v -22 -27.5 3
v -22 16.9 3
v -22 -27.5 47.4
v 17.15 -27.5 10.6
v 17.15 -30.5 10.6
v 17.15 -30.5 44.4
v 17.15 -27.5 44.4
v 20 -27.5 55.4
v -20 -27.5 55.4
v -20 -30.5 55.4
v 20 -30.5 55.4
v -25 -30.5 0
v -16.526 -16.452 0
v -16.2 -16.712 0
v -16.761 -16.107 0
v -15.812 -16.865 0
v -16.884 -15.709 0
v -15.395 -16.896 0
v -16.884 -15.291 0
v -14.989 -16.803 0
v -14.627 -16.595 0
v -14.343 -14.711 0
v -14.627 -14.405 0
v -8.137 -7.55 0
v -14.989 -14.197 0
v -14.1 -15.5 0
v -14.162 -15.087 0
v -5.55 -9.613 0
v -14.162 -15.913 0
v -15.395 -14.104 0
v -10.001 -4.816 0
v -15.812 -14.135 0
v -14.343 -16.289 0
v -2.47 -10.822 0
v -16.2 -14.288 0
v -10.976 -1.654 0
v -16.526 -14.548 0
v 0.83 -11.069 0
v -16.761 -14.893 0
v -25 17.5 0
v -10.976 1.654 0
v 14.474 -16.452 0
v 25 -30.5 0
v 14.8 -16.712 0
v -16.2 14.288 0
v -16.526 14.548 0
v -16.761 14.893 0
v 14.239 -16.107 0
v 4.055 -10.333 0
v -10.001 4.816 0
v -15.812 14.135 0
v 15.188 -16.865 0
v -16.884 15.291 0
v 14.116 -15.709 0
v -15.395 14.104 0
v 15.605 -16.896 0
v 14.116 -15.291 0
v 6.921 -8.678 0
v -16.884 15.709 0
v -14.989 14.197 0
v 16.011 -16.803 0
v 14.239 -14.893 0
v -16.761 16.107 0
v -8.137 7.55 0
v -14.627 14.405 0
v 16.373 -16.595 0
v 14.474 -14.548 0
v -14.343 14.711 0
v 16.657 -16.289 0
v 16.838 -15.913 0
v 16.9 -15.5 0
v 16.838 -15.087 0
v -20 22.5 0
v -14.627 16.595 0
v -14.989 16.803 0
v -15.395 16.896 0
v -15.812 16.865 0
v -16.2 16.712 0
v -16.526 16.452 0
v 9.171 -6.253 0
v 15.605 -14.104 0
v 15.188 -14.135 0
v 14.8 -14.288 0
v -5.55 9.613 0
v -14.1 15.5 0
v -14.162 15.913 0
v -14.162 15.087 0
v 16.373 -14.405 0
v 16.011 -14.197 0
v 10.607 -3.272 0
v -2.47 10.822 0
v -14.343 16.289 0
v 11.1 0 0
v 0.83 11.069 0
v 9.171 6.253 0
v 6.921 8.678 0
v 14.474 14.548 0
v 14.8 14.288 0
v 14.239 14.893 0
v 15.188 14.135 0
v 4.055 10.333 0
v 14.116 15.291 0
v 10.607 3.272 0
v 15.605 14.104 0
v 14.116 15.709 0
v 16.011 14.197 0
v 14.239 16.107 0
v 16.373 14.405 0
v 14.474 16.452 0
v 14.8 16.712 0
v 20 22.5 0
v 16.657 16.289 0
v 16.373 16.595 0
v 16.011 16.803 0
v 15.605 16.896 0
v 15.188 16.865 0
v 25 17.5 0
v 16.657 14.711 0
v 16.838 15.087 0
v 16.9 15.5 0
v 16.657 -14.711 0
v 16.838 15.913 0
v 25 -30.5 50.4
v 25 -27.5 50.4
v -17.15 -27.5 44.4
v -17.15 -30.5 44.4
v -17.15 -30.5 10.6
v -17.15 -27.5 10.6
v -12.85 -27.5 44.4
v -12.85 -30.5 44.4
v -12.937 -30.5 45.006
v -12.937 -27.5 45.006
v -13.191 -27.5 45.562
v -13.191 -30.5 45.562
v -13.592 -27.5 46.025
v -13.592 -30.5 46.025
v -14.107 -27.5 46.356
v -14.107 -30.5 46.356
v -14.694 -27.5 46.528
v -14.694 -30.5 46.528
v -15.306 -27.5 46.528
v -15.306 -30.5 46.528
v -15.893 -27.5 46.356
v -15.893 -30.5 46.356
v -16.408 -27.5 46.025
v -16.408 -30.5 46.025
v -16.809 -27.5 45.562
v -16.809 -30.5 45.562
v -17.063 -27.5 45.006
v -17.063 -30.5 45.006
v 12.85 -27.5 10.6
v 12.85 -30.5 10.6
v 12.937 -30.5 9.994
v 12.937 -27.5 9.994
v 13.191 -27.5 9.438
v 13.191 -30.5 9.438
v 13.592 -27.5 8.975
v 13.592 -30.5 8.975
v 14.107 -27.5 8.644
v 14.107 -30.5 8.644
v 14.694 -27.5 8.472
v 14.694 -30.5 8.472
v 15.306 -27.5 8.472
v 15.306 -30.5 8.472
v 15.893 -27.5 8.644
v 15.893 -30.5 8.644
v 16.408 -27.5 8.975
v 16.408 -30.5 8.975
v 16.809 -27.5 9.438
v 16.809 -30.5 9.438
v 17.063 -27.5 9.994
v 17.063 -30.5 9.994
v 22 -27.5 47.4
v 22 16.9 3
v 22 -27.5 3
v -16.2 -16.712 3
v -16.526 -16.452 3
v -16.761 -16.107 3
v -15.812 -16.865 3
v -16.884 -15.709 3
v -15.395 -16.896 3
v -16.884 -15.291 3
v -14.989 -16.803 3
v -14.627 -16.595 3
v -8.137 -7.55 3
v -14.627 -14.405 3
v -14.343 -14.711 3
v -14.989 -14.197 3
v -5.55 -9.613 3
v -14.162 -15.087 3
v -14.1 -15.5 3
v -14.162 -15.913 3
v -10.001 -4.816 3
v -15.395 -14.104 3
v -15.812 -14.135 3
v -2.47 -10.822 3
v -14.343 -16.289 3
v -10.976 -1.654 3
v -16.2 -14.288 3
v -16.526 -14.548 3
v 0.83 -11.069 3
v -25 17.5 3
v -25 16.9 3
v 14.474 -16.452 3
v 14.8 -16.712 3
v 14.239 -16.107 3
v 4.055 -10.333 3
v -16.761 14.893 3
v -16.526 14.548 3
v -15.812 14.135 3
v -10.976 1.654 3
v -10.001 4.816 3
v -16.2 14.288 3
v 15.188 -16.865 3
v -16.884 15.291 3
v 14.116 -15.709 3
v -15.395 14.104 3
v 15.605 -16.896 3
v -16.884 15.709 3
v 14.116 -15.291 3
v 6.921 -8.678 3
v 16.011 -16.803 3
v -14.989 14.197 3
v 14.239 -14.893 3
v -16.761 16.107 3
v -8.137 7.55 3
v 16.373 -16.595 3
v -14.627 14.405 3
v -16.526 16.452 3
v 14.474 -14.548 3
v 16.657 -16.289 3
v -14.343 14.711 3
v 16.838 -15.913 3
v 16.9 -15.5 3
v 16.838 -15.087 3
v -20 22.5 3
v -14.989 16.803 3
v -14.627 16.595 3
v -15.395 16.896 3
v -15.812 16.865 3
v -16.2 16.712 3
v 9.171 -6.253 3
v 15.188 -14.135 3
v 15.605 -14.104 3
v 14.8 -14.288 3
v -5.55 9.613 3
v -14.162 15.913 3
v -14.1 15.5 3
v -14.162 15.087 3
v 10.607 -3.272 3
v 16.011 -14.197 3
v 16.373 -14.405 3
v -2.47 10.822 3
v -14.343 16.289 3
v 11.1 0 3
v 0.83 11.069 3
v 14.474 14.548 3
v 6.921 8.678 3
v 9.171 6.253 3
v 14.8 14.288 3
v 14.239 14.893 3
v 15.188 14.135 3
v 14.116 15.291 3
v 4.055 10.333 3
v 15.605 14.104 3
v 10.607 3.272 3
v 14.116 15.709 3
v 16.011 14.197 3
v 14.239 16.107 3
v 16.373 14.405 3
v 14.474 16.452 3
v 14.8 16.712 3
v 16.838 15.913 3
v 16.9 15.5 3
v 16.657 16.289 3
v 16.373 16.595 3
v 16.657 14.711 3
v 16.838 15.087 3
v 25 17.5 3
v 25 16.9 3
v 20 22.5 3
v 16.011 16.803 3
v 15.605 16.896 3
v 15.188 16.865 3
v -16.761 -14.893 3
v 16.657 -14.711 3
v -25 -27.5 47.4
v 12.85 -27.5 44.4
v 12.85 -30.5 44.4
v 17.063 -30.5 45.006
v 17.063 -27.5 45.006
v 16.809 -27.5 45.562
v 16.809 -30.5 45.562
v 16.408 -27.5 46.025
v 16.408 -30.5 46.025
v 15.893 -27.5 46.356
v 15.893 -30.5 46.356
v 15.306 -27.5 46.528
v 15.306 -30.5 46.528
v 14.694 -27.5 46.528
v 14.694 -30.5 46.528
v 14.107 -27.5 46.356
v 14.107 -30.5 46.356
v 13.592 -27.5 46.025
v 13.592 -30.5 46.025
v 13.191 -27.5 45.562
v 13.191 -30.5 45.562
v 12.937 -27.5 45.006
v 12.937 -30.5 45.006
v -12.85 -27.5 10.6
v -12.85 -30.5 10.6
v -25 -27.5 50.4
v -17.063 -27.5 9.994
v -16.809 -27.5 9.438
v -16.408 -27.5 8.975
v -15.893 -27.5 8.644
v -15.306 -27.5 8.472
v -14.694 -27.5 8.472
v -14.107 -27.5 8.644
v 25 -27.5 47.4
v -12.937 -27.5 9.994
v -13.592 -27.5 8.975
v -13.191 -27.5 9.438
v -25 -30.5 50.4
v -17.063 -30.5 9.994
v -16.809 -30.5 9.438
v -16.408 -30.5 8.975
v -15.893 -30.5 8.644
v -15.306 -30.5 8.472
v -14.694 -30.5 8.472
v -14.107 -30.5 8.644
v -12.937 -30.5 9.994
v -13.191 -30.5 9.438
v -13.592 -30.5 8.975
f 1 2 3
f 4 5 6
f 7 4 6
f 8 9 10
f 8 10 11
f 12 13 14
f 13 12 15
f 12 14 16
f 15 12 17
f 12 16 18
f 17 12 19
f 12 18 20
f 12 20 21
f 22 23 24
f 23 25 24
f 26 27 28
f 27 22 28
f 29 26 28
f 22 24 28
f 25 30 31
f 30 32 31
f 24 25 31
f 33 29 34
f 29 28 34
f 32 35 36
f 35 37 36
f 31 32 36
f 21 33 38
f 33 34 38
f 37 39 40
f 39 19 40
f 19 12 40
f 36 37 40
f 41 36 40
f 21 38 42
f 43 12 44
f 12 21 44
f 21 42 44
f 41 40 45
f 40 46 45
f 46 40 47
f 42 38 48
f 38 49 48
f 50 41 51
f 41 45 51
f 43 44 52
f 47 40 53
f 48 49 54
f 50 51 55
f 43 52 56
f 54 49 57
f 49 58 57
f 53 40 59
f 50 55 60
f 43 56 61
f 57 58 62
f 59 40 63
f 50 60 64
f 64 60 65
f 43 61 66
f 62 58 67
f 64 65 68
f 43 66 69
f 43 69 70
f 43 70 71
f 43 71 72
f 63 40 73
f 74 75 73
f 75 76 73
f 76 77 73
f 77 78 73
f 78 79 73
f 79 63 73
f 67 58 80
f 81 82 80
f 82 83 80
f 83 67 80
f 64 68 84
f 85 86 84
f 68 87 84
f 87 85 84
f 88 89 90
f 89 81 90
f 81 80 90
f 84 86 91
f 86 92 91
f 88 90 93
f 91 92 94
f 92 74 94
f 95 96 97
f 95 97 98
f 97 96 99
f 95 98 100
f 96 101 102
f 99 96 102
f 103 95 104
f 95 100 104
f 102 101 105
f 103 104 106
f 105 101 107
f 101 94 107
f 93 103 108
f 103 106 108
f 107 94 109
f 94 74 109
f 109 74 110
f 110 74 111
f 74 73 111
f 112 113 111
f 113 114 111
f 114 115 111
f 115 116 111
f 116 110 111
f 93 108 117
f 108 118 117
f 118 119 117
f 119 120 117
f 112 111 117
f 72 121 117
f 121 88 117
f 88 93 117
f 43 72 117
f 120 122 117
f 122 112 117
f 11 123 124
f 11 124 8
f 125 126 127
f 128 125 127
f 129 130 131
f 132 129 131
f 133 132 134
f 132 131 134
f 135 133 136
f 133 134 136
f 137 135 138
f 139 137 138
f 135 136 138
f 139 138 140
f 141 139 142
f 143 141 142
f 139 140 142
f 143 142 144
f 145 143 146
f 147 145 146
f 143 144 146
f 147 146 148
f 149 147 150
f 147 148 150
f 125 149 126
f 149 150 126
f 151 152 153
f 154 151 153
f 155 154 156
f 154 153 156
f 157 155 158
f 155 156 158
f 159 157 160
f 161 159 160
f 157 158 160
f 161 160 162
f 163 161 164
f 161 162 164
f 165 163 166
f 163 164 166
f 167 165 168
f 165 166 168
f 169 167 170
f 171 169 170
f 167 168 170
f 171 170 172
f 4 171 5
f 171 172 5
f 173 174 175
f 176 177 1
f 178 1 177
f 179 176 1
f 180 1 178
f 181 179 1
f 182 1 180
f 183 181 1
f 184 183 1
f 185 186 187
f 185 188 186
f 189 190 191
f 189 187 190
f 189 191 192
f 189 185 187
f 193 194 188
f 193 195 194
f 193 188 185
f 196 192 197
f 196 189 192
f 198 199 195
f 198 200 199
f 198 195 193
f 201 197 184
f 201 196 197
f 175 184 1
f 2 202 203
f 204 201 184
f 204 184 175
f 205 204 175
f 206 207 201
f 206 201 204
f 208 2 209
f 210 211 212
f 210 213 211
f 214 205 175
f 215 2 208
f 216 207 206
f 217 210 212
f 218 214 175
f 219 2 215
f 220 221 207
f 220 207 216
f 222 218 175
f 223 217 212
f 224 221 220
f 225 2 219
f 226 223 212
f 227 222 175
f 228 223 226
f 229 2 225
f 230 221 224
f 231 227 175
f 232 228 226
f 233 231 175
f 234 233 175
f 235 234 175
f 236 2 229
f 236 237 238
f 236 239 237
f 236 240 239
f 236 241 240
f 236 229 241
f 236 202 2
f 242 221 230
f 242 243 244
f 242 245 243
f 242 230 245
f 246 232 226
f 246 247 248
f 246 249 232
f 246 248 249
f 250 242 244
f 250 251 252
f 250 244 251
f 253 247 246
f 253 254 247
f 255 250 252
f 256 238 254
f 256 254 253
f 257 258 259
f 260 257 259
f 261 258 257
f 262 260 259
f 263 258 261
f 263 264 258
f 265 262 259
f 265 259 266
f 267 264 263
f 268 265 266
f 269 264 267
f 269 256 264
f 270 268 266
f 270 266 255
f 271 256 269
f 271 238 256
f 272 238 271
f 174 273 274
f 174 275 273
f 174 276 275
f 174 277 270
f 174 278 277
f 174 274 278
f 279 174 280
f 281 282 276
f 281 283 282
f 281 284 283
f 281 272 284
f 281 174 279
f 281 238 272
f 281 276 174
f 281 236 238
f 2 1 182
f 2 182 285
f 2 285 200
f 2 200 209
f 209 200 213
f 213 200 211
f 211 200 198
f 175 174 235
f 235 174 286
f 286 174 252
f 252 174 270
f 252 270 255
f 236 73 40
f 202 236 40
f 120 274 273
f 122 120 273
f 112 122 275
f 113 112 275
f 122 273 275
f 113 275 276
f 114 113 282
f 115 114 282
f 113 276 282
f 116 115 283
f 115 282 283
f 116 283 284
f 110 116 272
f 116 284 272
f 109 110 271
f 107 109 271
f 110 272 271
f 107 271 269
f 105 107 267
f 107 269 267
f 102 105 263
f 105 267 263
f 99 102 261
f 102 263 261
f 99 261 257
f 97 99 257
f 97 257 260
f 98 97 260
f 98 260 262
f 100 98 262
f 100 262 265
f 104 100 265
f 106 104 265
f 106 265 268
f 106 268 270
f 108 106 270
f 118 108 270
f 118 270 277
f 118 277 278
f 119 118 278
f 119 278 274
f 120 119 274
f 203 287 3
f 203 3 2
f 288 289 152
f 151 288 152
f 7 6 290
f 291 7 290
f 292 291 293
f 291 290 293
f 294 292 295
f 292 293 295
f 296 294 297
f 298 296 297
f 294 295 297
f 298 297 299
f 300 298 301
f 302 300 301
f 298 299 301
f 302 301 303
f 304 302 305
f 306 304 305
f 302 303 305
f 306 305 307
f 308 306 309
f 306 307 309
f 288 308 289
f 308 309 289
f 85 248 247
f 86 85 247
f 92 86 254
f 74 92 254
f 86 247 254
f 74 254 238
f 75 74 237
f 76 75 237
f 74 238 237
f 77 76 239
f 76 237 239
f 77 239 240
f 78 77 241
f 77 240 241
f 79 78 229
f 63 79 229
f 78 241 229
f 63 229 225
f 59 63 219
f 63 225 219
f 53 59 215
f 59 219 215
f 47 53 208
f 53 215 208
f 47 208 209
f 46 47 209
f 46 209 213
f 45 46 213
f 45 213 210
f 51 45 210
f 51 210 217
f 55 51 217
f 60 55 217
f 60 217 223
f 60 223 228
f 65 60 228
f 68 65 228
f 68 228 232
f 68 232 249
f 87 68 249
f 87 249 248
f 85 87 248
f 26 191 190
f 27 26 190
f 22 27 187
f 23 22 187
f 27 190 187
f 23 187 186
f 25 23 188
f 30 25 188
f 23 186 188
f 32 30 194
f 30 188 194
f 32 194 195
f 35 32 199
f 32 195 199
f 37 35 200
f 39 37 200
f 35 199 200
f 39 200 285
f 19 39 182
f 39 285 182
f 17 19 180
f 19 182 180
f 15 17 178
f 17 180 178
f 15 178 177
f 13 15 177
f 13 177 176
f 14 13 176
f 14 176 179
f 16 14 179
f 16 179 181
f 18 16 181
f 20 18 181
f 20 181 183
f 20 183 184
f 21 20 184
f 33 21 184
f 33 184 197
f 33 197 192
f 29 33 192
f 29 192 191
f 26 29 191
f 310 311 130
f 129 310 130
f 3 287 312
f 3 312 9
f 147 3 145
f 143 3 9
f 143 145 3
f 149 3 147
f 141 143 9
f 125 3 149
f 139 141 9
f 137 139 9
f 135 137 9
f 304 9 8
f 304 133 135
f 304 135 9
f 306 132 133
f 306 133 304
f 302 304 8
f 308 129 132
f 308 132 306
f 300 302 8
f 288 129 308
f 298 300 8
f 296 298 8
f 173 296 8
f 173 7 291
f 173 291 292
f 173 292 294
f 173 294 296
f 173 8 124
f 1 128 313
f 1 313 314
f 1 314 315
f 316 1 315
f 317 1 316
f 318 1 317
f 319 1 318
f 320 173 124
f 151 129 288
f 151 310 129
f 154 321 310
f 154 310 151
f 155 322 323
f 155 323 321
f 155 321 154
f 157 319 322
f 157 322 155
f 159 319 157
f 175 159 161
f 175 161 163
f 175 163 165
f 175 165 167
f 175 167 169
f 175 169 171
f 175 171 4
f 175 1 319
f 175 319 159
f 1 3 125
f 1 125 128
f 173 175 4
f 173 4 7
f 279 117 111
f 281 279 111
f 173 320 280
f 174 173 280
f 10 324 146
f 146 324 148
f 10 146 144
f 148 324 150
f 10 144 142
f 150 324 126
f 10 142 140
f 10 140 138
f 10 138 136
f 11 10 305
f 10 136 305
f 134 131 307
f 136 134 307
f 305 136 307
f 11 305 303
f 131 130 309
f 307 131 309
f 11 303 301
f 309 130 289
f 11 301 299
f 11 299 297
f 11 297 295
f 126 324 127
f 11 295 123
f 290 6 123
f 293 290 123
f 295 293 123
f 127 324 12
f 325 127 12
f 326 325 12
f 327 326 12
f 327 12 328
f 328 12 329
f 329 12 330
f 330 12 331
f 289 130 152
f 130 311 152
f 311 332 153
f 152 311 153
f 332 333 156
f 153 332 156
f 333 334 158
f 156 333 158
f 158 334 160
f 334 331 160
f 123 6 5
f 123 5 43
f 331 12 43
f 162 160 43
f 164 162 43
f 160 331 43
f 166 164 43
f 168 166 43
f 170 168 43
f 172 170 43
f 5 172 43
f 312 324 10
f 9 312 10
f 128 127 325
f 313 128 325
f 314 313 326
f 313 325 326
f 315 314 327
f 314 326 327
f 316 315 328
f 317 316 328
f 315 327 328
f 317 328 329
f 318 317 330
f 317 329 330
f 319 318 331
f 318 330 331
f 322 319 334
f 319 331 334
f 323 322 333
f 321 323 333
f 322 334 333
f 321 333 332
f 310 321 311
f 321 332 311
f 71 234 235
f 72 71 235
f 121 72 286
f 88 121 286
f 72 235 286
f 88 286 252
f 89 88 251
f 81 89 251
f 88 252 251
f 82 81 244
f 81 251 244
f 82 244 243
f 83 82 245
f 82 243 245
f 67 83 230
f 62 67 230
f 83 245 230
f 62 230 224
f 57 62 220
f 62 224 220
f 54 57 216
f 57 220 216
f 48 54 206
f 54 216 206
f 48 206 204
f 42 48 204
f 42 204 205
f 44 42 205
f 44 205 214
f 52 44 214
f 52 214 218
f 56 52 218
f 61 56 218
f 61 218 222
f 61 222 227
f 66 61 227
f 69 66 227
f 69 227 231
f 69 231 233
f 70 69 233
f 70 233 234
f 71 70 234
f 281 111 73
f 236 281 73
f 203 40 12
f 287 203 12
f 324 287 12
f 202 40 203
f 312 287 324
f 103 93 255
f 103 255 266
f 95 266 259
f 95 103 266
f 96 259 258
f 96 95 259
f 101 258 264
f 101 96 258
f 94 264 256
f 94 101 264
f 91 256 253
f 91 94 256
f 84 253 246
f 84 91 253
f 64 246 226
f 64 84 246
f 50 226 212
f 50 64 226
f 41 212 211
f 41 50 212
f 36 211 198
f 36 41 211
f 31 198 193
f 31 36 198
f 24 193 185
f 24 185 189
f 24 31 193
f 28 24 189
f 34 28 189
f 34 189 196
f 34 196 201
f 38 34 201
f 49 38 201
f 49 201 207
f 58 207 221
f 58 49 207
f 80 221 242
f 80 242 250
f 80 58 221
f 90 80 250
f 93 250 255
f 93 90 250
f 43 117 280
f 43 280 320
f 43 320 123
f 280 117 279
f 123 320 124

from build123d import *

# Parameters (mm, degrees)
CROQUIS1_R              = 11.1
SALIENTE_EXTRUIR2_DEPTH = 3
CROQUIS2_R              = 1.4
CORTAR_EXTRUIR1_DEPTH   = 40.550600501
CROQUIS3_W              = 50
CROQUIS3_H              = 3
SALIENTE_EXTRUIR3_DEPTH = 52.4
CORTAR_EXTRUIR2_DEPTH   = 81.64217259
SALIENTE_EXTRUIR4_DEPTH = 3


with BuildPart() as part:
    # Croquis1 → Saliente-Extruir2 (new body)
    with BuildSketch(Plane.XY):
        Polygon((20, 22.5), (-20, 22.5), (-25, 17.5), (-25, -30.5), (25, -30.5), (25, 17.5), align=None)
        Circle(CROQUIS1_R, mode=Mode.SUBTRACT)
    extrude(amount=SALIENTE_EXTRUIR2_DEPTH)

    # Croquis2 → Cortar-Extruir1 (cut, through all)
    with BuildSketch(Plane.XY.offset(3)):
        with Locations((-15.5, 15.5)):
            Circle(CROQUIS2_R)
        with Locations((15.5, 15.5)):
            Circle(CROQUIS2_R)
        with Locations((15.5, -15.5)):
            Circle(CROQUIS2_R)
        with Locations((-15.5, -15.5)):
            Circle(CROQUIS2_R)
    extrude(amount=-CORTAR_EXTRUIR1_DEPTH, mode=Mode.SUBTRACT)

    # Croquis3 → Saliente-Extruir3 (add)
    with BuildSketch(Plane.XY.offset(3)):
        with Locations((0, -29)):
            Rectangle(CROQUIS3_W, CROQUIS3_H)
    extrude(amount=SALIENTE_EXTRUIR3_DEPTH)

    # Croquis4 → Cortar-Extruir2 (cut, through all)
    with BuildSketch(Plane.XZ.offset(30.5)):
        Polygon((-25, 50.4), (-20, 55.4), (-25, 55.4), align=None)
        with BuildLine():
            Line((-17.15, 44.4), (-17.15, 10.6))
            ThreePointArc((-17.15, 10.6), (-15, 8.45), (-12.85, 10.6))
            Line((-12.85, 10.6), (-12.85, 44.4))
            ThreePointArc((-12.85, 44.4), (-15, 46.55), (-17.15, 44.4))
        make_face()
        with BuildLine():
            Line((12.85, 44.4), (12.85, 10.6))
            ThreePointArc((12.85, 10.6), (15, 8.45), (17.15, 10.6))
            Line((17.15, 10.6), (17.15, 44.4))
            ThreePointArc((17.15, 44.4), (15, 46.55), (12.85, 44.4))
        make_face()
        Polygon((25, 55.4), (25, 50.4), (20, 55.4), align=None)
    extrude(amount=-CORTAR_EXTRUIR2_DEPTH, mode=Mode.SUBTRACT)

    # Croquis5 → Saliente-Extruir4 (add)
    with BuildSketch(Plane.ZY.offset(25)):
        Polygon((3, 16.9), (3, -27.5), (47.4, -27.5), align=None)
    saliente_extruir4 = extrude(amount=-SALIENTE_EXTRUIR4_DEPTH)

    # Simetría1: Saliente-Extruir4 across plane
    add(saliente_extruir4.mirror(Plane(origin=(0, 0, 0), x_dir=(0, 0, 1), z_dir=(1, 0, 0))))


solid = part.part
